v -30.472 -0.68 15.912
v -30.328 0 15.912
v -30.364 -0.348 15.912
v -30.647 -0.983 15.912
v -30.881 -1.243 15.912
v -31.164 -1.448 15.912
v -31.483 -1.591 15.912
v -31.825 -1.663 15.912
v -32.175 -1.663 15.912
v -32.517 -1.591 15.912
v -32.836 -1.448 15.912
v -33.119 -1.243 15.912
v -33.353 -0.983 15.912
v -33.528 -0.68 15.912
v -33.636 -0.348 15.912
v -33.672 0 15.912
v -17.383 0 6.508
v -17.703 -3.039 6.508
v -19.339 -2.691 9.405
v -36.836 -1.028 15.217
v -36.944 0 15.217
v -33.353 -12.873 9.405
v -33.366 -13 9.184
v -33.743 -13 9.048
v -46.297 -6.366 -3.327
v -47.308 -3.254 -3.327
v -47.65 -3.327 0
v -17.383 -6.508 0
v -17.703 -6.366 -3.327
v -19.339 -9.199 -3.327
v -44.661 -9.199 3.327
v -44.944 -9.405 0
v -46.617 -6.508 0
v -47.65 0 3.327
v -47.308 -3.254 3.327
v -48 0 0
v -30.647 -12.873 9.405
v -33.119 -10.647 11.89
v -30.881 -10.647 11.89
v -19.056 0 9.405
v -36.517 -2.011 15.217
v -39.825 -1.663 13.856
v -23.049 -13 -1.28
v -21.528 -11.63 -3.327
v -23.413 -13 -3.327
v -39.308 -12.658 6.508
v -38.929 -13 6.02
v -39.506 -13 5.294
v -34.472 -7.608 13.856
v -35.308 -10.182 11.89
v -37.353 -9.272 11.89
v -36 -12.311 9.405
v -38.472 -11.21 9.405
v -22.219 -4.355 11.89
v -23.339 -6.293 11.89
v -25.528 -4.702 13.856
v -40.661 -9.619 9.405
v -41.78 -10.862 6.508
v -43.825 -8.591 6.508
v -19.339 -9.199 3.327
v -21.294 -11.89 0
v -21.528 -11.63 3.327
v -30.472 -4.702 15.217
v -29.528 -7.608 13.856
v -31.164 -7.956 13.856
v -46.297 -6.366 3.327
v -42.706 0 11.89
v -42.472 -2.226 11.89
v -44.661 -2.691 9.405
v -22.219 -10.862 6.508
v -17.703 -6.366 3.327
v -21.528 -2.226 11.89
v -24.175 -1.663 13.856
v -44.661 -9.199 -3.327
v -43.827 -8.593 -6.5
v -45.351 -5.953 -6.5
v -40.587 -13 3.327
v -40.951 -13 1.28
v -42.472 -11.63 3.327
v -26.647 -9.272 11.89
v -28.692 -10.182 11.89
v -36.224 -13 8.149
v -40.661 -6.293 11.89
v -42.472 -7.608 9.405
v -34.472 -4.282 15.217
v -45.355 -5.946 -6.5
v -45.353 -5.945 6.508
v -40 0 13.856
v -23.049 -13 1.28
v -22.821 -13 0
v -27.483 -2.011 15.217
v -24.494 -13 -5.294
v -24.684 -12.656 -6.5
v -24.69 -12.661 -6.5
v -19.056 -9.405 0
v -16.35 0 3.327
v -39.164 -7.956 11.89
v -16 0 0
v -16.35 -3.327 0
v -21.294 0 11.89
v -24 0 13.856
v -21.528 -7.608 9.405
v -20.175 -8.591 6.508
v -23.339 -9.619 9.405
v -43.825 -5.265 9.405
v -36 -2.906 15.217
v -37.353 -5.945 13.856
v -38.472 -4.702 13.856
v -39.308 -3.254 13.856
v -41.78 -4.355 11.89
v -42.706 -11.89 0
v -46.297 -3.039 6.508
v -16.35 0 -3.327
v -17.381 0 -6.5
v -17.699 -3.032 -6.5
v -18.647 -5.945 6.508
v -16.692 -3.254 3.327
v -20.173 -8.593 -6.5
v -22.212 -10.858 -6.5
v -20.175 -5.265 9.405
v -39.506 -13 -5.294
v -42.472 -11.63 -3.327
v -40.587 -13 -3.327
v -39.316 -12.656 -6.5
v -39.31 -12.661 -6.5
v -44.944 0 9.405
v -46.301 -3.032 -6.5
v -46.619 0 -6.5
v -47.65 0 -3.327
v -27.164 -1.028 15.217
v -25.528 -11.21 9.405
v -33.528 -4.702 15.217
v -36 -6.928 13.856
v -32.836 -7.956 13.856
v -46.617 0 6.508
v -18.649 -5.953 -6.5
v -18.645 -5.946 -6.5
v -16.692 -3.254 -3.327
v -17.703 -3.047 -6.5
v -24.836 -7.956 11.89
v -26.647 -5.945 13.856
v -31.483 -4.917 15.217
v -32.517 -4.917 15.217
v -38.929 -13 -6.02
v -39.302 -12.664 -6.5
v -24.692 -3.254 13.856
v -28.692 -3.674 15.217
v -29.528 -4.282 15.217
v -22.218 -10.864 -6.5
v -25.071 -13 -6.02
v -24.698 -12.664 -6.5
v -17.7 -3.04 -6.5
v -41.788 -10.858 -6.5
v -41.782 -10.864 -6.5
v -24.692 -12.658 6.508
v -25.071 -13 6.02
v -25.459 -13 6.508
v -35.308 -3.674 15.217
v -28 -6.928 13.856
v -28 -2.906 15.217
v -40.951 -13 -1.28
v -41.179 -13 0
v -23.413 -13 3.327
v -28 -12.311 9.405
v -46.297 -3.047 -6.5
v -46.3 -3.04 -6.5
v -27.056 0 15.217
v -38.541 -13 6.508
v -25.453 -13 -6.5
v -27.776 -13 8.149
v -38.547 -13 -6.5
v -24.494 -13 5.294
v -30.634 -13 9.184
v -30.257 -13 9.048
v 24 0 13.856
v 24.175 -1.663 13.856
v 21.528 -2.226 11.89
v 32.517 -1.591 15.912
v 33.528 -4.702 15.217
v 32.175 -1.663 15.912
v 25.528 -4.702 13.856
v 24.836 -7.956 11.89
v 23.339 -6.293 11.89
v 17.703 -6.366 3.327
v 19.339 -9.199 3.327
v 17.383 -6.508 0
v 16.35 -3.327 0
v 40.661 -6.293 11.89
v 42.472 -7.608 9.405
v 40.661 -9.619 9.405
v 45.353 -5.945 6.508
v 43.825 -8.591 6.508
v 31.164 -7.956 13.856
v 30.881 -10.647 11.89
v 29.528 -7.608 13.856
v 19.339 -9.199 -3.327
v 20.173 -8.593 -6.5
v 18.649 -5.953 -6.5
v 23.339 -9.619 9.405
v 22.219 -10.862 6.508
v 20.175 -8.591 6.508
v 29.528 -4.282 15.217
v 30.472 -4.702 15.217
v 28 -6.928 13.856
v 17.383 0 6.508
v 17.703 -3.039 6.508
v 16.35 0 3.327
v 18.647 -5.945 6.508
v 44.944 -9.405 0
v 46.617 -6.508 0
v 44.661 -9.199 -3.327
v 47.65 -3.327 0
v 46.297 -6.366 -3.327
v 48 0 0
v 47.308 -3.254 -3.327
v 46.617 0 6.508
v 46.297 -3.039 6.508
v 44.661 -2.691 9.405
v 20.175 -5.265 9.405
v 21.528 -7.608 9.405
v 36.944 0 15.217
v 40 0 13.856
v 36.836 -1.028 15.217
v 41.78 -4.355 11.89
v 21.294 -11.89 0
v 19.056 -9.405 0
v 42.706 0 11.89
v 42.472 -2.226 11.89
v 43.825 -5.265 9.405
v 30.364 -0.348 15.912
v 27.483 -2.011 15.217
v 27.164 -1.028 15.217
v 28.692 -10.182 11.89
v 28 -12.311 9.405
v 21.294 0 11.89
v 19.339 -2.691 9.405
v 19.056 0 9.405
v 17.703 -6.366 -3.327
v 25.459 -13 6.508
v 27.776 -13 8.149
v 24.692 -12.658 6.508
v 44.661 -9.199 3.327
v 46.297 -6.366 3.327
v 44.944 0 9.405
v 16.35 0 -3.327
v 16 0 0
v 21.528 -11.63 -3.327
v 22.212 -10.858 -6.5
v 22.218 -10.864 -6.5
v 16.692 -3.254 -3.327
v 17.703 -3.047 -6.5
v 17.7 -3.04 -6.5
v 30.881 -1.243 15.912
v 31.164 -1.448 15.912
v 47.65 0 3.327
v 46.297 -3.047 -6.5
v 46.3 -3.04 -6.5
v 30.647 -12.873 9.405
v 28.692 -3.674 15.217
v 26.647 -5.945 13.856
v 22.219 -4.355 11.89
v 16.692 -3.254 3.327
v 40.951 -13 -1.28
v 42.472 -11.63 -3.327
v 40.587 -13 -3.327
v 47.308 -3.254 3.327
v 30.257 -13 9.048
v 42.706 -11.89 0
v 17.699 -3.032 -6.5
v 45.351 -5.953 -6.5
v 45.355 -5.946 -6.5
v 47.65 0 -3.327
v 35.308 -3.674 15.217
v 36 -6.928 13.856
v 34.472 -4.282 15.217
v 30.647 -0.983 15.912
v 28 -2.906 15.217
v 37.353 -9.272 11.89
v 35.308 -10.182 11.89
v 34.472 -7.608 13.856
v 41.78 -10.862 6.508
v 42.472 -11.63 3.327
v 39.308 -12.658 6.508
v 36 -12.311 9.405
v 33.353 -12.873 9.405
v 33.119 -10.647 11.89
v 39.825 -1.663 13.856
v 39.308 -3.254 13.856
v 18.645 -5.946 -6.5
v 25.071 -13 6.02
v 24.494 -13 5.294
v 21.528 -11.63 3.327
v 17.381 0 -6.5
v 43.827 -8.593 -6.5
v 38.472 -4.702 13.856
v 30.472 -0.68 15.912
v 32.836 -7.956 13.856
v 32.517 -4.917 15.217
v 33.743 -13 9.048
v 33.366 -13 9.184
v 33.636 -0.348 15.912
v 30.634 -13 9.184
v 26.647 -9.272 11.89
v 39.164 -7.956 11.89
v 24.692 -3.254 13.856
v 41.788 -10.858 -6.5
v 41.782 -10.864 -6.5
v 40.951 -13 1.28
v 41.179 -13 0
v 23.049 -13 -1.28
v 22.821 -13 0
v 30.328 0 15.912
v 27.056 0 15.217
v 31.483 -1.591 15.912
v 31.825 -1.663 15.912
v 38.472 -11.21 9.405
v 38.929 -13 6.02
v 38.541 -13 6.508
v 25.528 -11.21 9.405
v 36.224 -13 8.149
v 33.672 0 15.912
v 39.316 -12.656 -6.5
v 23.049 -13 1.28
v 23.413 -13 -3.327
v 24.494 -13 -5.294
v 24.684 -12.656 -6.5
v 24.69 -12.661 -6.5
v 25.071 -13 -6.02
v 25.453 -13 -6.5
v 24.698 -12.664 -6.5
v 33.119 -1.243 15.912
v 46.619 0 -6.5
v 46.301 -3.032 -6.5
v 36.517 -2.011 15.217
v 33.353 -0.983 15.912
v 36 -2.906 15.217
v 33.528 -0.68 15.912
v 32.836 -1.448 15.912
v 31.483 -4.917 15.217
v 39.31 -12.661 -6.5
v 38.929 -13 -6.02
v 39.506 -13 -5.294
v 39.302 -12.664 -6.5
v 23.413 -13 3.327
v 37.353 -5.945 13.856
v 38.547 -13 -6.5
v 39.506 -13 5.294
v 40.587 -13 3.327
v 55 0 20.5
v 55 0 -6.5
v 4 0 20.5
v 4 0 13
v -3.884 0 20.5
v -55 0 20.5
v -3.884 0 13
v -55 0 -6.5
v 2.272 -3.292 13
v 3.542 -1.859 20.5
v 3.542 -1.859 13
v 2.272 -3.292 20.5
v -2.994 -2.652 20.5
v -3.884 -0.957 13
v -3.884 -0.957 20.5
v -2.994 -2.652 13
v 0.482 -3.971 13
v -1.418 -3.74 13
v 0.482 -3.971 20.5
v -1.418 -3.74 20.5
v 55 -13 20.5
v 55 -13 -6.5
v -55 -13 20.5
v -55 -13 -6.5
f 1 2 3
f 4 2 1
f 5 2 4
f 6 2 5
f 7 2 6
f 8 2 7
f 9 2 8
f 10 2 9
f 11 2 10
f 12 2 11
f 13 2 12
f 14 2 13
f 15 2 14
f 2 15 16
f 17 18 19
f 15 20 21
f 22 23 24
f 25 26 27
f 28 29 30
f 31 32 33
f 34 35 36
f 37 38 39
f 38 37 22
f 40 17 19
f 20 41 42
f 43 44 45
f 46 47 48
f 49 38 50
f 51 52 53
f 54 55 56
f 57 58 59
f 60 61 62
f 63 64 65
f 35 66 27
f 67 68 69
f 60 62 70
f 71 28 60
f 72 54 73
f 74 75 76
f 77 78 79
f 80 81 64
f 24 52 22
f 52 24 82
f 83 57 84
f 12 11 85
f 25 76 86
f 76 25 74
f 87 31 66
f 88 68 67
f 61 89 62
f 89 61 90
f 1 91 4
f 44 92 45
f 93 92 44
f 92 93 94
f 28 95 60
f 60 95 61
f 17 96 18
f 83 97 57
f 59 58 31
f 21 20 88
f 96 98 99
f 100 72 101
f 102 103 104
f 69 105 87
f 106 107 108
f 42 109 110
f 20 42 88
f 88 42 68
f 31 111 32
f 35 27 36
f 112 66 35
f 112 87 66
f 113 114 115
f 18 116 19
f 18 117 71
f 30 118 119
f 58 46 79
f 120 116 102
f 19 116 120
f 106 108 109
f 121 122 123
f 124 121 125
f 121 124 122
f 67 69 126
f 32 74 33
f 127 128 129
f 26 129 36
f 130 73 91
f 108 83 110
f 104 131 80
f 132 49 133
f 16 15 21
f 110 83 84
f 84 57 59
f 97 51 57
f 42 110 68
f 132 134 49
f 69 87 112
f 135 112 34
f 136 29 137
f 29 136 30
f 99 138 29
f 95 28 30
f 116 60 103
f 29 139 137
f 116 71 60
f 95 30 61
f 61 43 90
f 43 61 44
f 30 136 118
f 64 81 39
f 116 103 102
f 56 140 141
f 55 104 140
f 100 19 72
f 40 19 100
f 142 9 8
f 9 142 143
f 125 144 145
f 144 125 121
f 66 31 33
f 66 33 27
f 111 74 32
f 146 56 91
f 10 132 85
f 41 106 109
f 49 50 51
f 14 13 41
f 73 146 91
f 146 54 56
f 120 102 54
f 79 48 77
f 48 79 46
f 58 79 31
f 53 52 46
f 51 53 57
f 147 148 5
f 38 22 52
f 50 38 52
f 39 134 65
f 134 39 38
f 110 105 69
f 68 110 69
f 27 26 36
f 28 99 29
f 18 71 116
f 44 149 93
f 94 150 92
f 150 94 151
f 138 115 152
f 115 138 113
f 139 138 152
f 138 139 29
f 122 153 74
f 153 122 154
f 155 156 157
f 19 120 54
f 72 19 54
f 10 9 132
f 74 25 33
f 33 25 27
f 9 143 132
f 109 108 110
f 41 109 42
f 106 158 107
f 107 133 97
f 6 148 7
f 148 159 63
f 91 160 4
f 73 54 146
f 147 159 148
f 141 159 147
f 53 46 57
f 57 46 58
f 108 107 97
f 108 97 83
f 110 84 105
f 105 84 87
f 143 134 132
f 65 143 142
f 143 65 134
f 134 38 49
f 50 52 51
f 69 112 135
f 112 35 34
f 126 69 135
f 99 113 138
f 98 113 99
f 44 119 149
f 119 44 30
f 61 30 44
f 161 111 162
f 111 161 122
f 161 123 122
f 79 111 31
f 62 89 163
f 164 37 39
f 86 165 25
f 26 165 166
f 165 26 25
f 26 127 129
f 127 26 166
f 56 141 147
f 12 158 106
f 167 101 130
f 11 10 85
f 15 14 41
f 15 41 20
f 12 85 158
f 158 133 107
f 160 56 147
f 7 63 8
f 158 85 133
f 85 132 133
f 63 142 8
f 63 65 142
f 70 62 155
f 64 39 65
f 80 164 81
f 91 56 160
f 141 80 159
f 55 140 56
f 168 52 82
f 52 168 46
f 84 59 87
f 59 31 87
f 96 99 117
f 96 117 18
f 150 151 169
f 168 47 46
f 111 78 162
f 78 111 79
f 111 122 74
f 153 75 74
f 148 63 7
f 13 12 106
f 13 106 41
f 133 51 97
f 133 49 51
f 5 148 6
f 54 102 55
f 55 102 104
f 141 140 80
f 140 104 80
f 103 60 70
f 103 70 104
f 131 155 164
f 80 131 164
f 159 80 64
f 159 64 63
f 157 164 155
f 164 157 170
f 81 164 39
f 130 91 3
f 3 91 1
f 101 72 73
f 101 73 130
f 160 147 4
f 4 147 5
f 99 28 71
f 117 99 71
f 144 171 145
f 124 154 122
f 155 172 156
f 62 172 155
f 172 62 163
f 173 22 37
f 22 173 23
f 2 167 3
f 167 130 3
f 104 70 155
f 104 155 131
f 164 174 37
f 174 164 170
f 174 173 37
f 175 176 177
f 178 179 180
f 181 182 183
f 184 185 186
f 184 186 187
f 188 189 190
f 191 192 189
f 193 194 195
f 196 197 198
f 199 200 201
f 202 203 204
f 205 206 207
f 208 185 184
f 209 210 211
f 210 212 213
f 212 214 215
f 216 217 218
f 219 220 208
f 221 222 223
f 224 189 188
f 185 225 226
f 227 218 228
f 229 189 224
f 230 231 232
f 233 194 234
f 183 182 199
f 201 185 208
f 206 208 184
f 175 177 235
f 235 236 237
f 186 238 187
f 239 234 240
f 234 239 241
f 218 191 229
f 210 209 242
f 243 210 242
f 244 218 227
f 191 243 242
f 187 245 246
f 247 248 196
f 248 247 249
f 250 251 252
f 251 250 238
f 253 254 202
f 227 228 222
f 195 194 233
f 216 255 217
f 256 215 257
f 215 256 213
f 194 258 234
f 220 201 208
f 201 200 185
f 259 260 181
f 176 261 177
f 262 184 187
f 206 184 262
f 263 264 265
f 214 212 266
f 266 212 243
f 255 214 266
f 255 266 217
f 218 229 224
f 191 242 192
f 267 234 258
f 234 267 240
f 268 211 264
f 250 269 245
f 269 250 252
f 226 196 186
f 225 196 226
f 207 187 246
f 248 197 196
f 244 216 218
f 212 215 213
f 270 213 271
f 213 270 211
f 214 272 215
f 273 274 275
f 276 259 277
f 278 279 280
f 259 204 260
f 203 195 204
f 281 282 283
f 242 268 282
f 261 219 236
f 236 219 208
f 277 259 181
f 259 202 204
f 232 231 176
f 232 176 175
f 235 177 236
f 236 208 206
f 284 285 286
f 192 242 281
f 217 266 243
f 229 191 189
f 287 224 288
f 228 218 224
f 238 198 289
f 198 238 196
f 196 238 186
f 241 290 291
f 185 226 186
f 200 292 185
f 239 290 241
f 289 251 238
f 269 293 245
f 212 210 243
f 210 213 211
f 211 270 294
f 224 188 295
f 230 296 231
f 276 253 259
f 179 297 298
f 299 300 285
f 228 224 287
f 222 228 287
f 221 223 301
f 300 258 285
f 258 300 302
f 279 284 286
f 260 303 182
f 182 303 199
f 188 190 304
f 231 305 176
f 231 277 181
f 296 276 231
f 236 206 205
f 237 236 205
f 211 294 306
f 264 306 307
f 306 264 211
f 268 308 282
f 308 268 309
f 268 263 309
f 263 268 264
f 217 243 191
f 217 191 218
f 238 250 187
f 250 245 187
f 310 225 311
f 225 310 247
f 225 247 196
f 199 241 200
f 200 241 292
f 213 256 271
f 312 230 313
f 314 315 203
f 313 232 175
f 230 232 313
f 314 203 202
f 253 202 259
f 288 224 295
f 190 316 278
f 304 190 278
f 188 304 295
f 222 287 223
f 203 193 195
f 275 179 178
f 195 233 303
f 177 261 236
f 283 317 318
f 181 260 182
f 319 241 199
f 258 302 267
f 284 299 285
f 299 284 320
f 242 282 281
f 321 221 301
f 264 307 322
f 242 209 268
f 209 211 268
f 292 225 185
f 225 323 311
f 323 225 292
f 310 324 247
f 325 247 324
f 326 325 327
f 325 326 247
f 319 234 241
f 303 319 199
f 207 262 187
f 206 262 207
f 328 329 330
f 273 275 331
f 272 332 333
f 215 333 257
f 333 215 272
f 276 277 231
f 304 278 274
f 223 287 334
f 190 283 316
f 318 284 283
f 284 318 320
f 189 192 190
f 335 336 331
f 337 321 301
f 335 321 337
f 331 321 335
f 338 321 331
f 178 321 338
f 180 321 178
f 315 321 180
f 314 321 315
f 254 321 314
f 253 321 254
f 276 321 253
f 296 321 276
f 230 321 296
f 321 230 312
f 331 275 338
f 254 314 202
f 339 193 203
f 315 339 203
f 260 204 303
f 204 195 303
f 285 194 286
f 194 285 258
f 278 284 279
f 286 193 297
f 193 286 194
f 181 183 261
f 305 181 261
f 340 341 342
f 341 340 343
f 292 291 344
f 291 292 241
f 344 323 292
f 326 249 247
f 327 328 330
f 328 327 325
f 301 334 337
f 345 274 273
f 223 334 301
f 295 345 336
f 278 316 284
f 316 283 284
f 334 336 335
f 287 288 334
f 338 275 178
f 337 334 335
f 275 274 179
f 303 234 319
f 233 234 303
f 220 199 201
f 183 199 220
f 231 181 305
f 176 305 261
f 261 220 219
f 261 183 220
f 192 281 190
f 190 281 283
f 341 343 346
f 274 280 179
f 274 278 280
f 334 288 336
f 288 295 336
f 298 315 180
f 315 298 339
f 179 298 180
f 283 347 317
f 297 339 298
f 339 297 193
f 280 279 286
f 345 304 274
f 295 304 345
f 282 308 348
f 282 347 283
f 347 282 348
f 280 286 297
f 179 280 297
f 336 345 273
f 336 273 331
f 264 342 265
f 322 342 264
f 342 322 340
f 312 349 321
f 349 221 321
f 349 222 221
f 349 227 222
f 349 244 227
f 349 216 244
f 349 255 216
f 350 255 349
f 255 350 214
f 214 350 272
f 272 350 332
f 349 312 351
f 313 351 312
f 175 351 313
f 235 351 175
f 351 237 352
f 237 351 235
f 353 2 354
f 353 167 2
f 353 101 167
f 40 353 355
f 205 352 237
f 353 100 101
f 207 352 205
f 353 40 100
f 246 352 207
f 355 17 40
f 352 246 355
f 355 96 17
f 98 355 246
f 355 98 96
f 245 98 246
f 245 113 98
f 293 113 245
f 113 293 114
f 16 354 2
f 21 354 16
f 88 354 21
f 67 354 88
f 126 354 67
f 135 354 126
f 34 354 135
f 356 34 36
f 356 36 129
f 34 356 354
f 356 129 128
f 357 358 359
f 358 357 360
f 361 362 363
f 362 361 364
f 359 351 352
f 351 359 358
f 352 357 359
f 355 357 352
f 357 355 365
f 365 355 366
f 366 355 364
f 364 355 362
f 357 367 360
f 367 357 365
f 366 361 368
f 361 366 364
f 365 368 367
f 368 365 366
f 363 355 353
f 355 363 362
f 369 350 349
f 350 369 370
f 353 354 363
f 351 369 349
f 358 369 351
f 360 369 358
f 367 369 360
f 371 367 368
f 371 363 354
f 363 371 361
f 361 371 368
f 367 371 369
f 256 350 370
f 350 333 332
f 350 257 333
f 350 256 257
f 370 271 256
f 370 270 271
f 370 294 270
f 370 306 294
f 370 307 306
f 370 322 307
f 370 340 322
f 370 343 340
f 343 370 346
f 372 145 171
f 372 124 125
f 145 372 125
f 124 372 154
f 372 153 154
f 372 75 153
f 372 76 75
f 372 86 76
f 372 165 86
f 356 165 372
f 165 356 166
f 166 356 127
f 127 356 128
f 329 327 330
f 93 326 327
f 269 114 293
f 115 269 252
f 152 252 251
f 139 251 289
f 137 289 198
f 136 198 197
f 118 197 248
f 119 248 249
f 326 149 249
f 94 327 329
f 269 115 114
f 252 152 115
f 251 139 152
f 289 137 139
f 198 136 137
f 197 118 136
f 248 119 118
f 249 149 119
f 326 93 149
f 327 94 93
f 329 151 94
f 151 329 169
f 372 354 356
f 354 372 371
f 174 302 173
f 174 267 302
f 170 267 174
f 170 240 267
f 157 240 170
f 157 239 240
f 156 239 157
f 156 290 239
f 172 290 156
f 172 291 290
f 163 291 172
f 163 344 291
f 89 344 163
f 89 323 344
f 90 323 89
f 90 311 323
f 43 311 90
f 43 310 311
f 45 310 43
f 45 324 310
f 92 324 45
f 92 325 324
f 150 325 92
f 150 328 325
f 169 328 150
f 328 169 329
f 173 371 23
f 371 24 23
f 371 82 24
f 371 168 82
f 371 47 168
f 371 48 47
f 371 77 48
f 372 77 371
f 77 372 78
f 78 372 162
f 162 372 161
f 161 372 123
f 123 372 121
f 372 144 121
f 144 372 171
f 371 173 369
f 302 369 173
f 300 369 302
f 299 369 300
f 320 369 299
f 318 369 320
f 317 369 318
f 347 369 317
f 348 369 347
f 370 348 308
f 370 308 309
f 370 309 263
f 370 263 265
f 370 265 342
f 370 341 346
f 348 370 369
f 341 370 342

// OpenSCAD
/*difference() {
   sphere(14);
    translate([0,0,20]){
        cube([40, 40, 48], true);
    } 
    sphere(14);
    translate([0,5,20]){
        cube([40, 40, 48], true);
    } 
}*/

difference() {
    

    translate([0,0,7]) {
        cube([110, 26, 27], true);
    }
    
    cutaway();

}


module cutaway() {
    translate([-32,0,0]) {
        sphere(16);  
    }

    translate([32,0,0]) {
        sphere(16);  
    }

    translate([0,25,0]) {
        cube([120, 50, 57], true);
    }
    translate([0,0,18]) {
        cylinder(10,4,4, true);
    }
}
